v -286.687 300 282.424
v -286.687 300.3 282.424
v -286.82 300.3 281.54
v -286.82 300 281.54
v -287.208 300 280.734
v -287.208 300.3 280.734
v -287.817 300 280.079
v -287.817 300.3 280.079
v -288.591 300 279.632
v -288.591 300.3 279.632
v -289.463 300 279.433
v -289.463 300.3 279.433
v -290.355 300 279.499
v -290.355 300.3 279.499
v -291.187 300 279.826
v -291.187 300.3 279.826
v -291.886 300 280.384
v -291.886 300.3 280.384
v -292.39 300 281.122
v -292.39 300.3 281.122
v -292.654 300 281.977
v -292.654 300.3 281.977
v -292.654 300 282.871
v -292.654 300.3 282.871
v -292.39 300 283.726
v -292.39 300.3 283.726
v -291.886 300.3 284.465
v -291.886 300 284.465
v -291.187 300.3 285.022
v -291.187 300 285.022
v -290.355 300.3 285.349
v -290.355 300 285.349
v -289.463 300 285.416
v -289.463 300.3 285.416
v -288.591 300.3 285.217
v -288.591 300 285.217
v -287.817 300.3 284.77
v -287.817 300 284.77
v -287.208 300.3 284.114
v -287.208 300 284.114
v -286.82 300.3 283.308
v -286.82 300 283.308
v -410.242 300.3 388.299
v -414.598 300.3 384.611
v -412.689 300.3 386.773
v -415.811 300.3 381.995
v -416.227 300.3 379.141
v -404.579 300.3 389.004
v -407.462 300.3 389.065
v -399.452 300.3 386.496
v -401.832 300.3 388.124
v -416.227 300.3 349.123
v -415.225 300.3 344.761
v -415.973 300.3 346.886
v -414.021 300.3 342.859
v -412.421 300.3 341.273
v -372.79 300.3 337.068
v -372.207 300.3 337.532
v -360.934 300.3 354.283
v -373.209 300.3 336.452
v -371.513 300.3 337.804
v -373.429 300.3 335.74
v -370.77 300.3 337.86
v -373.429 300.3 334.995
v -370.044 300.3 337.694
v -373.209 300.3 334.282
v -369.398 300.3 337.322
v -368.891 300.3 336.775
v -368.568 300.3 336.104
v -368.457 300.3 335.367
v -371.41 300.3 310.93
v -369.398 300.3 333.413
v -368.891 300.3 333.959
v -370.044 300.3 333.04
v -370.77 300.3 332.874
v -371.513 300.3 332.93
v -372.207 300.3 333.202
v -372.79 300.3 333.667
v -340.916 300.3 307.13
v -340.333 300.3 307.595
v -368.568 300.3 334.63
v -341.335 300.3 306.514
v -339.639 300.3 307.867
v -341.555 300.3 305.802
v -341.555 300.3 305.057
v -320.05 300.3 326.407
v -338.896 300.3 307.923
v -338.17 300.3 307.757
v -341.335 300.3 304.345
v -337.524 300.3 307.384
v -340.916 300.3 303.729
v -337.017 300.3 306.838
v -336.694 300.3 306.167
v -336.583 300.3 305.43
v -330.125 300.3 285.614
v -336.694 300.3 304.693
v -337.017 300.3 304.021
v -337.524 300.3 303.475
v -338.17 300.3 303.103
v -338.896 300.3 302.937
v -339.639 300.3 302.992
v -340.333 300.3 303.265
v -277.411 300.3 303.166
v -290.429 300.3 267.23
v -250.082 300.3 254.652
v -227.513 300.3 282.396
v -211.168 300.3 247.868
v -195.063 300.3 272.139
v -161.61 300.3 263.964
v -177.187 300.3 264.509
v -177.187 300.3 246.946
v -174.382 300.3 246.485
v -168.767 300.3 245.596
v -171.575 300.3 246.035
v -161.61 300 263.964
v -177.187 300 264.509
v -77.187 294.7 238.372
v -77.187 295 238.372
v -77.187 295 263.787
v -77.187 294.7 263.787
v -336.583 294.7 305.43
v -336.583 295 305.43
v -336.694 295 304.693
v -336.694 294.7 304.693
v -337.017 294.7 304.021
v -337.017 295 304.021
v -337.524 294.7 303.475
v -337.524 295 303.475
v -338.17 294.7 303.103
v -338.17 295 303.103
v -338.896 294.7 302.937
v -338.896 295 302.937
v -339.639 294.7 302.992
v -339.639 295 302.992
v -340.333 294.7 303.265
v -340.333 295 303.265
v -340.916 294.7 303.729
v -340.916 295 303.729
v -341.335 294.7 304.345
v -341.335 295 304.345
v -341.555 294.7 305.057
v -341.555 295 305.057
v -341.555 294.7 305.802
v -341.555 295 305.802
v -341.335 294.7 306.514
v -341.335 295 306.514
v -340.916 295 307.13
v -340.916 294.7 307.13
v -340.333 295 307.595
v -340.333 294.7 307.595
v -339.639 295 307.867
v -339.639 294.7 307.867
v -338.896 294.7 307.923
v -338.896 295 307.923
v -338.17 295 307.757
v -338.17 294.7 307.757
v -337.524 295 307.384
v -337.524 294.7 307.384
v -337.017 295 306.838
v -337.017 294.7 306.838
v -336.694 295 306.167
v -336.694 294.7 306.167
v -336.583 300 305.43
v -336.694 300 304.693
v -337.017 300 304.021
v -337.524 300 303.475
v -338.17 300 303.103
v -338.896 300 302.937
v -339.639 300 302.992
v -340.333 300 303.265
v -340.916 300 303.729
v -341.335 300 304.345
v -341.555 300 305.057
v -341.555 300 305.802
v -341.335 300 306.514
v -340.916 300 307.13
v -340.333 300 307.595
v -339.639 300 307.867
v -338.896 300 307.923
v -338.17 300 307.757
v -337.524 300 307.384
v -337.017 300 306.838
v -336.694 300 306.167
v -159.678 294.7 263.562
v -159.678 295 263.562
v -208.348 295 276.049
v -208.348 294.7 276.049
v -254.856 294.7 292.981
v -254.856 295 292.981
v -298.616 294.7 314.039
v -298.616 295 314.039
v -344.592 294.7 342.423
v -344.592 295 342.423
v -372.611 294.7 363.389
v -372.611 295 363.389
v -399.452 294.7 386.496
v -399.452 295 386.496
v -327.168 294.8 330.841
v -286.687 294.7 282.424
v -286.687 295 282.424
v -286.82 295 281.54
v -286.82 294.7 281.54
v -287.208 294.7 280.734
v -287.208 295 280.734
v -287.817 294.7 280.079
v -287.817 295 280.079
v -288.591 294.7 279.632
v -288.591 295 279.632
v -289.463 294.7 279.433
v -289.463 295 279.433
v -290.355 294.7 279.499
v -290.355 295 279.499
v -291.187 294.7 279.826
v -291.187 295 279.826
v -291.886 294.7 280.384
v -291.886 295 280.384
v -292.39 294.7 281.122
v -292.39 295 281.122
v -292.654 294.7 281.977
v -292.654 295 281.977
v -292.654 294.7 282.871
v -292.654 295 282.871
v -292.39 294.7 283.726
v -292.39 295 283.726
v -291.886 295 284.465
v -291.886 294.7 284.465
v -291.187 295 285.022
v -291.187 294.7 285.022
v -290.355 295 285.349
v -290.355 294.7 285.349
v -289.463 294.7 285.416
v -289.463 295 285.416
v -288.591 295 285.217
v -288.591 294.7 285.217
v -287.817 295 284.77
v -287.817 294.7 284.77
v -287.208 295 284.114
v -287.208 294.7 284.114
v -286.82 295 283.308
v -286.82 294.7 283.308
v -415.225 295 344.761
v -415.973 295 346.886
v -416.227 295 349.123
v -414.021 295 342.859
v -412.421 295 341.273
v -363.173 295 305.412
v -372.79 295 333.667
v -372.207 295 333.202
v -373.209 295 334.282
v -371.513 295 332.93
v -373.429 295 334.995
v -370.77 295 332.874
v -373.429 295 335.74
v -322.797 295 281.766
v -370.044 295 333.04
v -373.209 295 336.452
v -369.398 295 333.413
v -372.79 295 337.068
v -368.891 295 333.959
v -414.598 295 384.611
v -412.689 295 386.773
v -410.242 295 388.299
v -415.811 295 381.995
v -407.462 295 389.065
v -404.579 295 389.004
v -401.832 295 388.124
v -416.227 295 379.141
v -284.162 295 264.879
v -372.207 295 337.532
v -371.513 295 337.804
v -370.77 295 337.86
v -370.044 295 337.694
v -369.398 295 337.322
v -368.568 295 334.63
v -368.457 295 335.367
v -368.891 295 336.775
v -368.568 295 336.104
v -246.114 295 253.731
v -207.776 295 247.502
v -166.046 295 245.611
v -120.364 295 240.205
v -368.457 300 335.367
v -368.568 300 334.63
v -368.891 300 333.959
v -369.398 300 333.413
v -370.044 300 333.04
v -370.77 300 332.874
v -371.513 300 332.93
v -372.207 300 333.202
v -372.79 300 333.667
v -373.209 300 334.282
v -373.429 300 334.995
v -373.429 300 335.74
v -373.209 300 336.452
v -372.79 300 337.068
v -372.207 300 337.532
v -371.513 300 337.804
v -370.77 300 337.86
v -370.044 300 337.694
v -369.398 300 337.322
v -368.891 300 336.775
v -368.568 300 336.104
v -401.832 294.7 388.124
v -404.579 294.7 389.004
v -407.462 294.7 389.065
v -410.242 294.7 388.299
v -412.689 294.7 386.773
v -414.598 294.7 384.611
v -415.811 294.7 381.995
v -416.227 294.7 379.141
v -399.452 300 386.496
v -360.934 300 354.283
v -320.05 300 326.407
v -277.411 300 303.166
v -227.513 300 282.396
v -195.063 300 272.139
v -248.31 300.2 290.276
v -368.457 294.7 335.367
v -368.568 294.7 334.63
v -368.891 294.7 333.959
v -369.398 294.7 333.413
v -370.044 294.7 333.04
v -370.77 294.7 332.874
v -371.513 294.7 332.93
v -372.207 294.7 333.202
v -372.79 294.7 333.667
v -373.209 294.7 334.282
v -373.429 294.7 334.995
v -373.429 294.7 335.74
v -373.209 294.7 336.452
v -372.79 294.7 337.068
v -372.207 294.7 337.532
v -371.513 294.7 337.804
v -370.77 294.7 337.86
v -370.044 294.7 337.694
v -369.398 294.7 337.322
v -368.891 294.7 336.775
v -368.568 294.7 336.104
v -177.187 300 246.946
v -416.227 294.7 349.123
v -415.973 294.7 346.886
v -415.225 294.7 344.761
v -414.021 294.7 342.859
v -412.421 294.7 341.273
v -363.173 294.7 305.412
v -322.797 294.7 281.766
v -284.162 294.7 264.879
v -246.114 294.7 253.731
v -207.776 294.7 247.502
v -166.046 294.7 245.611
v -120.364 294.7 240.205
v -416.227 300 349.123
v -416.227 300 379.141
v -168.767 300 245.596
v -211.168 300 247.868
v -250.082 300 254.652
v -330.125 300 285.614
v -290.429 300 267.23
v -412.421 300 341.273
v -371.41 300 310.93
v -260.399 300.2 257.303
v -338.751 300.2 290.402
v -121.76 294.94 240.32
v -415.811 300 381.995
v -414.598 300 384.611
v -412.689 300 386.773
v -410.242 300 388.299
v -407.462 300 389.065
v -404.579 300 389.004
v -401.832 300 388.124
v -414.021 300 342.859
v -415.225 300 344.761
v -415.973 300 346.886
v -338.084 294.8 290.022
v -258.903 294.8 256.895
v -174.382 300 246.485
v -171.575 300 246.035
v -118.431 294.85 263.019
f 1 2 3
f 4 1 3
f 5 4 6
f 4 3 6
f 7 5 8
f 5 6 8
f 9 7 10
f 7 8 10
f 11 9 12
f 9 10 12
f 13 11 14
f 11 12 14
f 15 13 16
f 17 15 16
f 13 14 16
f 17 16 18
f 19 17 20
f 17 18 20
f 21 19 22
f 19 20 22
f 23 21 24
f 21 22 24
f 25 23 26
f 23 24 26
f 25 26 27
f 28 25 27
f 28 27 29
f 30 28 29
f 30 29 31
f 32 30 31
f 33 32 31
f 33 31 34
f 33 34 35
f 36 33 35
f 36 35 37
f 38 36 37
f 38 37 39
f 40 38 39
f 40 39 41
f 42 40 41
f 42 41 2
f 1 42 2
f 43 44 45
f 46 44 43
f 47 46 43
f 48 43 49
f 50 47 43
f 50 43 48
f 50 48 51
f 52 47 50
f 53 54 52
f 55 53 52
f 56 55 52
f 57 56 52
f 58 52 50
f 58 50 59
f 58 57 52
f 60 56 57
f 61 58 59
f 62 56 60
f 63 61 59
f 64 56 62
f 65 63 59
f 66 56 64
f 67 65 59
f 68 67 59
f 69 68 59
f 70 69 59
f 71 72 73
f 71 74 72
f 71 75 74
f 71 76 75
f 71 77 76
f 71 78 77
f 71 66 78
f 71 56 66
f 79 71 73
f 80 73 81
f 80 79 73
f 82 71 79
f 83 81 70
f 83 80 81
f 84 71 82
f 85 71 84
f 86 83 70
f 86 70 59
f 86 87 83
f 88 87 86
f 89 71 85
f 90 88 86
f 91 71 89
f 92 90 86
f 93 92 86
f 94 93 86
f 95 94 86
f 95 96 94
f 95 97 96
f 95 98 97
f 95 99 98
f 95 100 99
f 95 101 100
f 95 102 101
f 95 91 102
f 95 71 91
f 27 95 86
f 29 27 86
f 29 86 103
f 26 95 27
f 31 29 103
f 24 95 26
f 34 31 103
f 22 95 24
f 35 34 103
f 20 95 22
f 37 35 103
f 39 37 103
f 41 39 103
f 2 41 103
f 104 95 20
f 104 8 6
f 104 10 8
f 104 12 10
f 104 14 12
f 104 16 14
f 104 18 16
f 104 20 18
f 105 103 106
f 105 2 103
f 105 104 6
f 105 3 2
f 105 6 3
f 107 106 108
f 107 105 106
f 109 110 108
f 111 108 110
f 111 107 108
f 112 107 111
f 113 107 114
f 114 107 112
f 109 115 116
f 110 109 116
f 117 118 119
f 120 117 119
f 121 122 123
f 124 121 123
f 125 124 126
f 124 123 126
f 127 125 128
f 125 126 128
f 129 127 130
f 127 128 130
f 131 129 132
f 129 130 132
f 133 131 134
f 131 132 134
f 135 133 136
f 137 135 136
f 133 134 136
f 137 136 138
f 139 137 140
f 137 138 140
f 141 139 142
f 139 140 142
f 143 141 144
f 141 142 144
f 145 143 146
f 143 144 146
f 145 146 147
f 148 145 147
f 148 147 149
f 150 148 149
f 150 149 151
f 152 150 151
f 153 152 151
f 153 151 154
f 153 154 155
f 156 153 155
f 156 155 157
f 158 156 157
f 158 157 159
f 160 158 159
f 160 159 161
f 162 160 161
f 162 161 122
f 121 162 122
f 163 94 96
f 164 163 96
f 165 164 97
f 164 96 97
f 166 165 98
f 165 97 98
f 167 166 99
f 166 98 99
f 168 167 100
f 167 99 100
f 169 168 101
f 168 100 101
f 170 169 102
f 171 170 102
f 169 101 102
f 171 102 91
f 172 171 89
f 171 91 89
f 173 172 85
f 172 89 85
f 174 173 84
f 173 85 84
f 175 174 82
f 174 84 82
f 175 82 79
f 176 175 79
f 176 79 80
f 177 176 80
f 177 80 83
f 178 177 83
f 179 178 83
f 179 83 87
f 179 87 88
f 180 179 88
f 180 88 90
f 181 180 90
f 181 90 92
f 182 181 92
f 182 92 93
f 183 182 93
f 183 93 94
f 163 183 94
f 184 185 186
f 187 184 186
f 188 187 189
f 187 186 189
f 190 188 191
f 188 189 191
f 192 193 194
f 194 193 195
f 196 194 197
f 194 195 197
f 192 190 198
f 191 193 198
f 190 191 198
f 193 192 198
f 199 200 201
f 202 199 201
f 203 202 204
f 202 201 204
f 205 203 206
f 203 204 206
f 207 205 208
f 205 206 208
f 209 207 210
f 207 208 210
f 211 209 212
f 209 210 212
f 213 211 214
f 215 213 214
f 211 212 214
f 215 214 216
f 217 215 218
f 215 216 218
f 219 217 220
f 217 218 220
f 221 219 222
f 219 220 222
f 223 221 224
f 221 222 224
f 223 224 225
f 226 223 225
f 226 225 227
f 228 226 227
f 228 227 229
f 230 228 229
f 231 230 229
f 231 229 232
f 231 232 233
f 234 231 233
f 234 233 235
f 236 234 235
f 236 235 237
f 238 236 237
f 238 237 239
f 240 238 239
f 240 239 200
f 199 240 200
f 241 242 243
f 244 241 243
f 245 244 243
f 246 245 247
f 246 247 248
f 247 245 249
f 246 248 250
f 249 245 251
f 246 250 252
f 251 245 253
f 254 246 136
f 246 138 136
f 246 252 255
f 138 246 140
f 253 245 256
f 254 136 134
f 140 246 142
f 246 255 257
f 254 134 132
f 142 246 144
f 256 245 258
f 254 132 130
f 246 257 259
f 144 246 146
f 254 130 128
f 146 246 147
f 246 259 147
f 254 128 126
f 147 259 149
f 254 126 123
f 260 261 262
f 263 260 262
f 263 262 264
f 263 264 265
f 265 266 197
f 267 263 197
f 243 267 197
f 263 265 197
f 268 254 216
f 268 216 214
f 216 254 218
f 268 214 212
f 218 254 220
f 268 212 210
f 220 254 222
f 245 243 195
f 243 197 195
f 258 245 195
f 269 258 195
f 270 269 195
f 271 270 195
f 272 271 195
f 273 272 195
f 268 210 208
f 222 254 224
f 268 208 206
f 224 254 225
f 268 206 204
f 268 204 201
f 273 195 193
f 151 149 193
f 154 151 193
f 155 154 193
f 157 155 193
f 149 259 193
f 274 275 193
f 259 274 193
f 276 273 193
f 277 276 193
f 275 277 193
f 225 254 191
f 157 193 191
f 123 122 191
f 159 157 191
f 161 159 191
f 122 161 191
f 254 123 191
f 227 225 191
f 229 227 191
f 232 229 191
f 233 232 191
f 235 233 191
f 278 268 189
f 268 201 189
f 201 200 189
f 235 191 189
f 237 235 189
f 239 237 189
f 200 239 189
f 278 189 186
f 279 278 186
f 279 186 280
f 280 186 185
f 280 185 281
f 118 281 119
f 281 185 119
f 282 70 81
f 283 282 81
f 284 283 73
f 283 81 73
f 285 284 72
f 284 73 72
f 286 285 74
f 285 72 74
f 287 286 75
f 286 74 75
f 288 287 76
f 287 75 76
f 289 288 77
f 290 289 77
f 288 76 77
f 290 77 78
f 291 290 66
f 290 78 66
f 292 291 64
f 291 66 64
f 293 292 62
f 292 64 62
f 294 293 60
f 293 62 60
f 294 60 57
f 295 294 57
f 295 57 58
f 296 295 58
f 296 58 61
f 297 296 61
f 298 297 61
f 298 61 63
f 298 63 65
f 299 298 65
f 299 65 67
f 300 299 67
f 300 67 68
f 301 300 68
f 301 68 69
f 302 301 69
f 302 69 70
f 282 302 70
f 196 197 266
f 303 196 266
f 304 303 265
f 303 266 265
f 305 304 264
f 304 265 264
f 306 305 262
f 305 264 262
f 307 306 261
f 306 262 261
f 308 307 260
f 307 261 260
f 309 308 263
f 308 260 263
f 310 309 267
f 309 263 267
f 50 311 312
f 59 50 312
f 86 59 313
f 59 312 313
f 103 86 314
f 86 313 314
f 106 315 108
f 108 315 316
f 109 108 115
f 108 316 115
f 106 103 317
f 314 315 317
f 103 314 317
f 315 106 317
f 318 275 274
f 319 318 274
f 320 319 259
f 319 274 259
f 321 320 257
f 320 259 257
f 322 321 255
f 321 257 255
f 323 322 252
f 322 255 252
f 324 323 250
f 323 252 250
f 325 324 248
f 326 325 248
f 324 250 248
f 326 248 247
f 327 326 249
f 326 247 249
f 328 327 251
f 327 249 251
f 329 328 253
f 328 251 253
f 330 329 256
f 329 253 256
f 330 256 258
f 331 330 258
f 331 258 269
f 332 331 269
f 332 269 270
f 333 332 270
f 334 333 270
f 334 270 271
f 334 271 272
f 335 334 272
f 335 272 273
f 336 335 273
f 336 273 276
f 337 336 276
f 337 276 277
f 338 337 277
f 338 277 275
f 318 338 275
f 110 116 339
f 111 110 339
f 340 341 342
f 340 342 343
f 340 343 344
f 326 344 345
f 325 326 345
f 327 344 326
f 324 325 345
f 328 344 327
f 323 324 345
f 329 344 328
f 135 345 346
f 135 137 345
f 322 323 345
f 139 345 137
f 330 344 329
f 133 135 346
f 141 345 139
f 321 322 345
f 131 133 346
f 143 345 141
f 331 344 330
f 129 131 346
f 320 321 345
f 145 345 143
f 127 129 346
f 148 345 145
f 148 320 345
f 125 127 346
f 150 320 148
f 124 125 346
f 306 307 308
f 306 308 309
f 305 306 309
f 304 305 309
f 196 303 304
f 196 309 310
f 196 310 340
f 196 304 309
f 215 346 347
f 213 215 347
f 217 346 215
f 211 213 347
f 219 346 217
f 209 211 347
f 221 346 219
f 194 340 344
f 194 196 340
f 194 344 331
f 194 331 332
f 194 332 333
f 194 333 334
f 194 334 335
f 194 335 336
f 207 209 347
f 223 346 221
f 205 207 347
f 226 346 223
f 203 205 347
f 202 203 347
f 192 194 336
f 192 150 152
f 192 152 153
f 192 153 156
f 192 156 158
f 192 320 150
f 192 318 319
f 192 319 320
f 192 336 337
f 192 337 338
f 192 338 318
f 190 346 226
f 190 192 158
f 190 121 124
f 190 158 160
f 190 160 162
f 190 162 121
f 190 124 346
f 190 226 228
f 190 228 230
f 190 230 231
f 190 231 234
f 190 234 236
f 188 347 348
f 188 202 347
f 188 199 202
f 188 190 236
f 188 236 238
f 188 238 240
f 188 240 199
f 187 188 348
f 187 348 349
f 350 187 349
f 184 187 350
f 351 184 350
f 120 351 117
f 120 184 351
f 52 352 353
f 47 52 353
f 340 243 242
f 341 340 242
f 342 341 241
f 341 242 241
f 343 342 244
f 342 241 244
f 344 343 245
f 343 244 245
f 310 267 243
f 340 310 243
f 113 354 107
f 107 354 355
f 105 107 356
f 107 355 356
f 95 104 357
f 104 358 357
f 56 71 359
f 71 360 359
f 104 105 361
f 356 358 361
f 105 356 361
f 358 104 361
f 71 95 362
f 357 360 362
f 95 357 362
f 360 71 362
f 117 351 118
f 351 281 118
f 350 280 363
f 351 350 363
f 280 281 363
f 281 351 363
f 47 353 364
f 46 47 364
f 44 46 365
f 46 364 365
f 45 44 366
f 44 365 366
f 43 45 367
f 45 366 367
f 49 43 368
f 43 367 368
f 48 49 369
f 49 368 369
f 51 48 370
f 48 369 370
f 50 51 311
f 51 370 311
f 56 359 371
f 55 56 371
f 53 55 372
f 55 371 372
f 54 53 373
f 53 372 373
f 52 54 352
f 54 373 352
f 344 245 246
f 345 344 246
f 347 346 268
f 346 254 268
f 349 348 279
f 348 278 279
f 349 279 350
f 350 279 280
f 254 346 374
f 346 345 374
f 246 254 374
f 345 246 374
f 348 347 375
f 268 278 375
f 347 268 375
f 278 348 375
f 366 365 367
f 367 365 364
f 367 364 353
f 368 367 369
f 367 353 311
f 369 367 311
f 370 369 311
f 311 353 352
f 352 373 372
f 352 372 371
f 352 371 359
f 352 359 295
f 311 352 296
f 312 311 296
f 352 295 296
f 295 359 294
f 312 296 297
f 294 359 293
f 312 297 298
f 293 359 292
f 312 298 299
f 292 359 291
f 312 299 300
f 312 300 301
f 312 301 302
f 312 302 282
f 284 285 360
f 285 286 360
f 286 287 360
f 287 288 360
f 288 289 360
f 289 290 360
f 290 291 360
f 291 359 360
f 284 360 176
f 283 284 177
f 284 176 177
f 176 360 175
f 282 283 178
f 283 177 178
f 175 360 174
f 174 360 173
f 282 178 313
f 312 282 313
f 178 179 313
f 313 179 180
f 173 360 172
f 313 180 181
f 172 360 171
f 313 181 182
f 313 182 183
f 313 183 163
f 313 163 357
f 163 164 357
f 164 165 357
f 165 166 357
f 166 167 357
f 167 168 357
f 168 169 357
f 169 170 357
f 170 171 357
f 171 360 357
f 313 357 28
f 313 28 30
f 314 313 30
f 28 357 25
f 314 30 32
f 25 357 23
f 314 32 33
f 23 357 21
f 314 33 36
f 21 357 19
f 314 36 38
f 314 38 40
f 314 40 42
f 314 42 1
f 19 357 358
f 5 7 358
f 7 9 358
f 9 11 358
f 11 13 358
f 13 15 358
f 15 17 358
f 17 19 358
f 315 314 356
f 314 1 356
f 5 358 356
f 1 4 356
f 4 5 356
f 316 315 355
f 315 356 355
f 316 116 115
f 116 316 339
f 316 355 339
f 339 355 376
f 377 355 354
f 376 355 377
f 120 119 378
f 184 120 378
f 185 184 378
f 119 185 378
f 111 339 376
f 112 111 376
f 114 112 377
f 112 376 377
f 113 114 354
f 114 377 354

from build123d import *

# Parameters (mm, degrees)
DODANIE_WYCI_GNI_CIE1_DEPTH = 0.3
DODANIE_WYCI_GNI_CIE2_DEPTH = 0.3
SZKIC3_R                    = 2.5
SZKIC3_R_2                  = 3
WYTNIJ_WYCI_GNI_CIE1_DEPTH  = 12


with BuildPart() as part:
    # Szkic1 → Dodanie-wyciągnięcie1 (new body)
    with BuildSketch(Plane.XZ.offset(-295)):
        with BuildLine():
            Line((-77.187477809, 238.371526152), (-77.187477809, 263.787467627))
            add(Edge.make_bspline(
                [(-77.187477809, 263.787467627), (-90.931891454, 263.302665158), (-104.681952299, 263.050489589), (-132.179761623, 262.98712509), (-145.931371492, 263.172070993), (-159.678350984, 263.562143643)],
                knots=[0, 0, 0, 0, 0.5, 0.5, 1, 1, 1, 1], degree=3))
            add(Edge.make_bspline(
                [(-159.678350984, 263.562143643), (-250.706696635, 282.330267514), (-331.16632582, 323.598422626), (-399.451682504, 386.496425626)],
                knots=[0, 0, 0, 0, 0.864061194, 0.864061194, 0.864061194, 0.864061194], degree=3))
            ThreePointArc((-399.451682504, 386.496425626), (-410.242264679, 388.299488123), (-416.226649581, 379.141167568))
            Line((-416.226649581, 379.141167568), (-416.226649581, 349.123356926))
            ThreePointArc((-416.226649581, 349.123356926), (-415.225213611, 344.76149432), (-412.421480502, 341.273256936))
            add(Edge.make_bspline(
                [(-412.421480502, 341.273256936), (-337.562441747, 282.198966343), (-268.684783511, 244.73497802), (-166.046176885, 245.61070335)],
                knots=[0.076862335, 0.076862335, 0.076862335, 0.076862335, 0.98459041, 0.98459041, 0.98459041, 0.98459041], degree=3))
            add(Edge.make_bspline(
                [(-166.046176885, 245.61070335), (-158.691588186, 244.479612696), (-151.319796636, 243.468209688), (-136.557675168, 241.699121012), (-129.165088755, 240.940959885), (-114.354878372, 239.699183419), (-106.937301858, 239.215047722), (-95.790102143, 238.717306802), (-92.070055878, 238.589825858), (-84.62985785, 238.417469406), (-80.909047989, 238.372473536), (-77.187477809, 238.371526152)],
                knots=[0, 0, 0, 0, 0.25, 0.25, 0.5, 0.5, 0.75, 0.75, 0.875, 0.875, 1, 1, 1, 1], degree=3))
        make_face()
    extrude(amount=DODANIE_WYCI_GNI_CIE1_DEPTH)


with BuildPart() as body_2:
    # Szkic2 → Dodanie-wyciągnięcie2 (new body)
    with BuildSketch(Plane(origin=(0, 300, 0), x_dir=(1, 0, 0), z_dir=(0, 1, 0))):
        with BuildLine():
            Line((-177.187477809, -264.509119585), (-177.187477809, -246.945846168))
            ThreePointArc((-177.187477809, -246.945846168), (-172.97904925, -246.258320434), (-168.766510621, -245.596443654))
            add(Edge.make_bspline(
                [(-168.766510621, -245.596443654), (-269.905820359, -245.400566453), (-338.225722809, -282.722388215), (-412.421480502, -341.273256936)],
                knots=[0.084905169, 0.084905169, 0.084905169, 0.084905169, 0.98459041, 0.98459041, 0.98459041, 0.98459041], degree=3))
            ThreePointArc((-412.421480502, -341.273256936), (-415.225213611, -344.76149432), (-416.226649581, -349.123356926))
            Line((-416.226649581, -349.123356926), (-416.226649581, -379.141167568))
            ThreePointArc((-416.226649581, -379.141167568), (-410.242264679, -388.299488123), (-399.451682504, -386.496425626))
            add(Edge.make_bspline(
                [(-399.451682504, -386.496425626), (-331.649658003, -324.043622455), (-251.84509308, -282.915553357), (-161.609691541, -263.964054369)],
                knots=[0, 0, 0, 0, 0.857945262, 0.857945262, 0.857945262, 0.857945262], degree=3))
            add(Edge.make_bspline(
                [(-161.609691541, -263.964054369), (-163.461784936, -264.018551283), (-167.684740985, -264.151245151), (-172.876910079, -264.337762118), (-176.217014145, -264.469751133), (-177.187477809, -264.509119585)],
                knots=[0.455950291, 0.455950291, 0.455950291, 0.455950291, 0.480354949, 0.511604949, 0.524404658, 0.524404658, 0.524404658, 0.524404658], degree=3))
        make_face()
    extrude(amount=DODANIE_WYCI_GNI_CIE2_DEPTH)


with BuildPart() as wytnij_wyci_gni_cie1_tool:
    # Szkic3 → Wytnij-wyciągnięcie1 (new body)
    with BuildSketch(Plane(origin=(0, 300.3, 0), x_dir=(1, 0, 0), z_dir=(0, 1, 0))):
        with Locations((-370.956911026, -335.367132453)):
            Circle(SZKIC3_R)
        with Locations((-339.082998521, -305.429754445)):
            Circle(SZKIC3_R)
        with Locations((-289.68705591, -282.424125213)):
            Circle(SZKIC3_R_2)
    extrude(amount=-WYTNIJ_WYCI_GNI_CIE1_DEPTH)


with BuildPart() as part_1:
    add(part.part)

    # Wytnij-wyciągnięcie1: cut by wytnij_wyci_gni_cie1_tool
    add(wytnij_wyci_gni_cie1_tool.part, mode=Mode.SUBTRACT)


with BuildPart() as body_2_1:
    add(body_2.part)

    # Wytnij-wyciągnięcie1: cut by wytnij_wyci_gni_cie1_tool
    add(wytnij_wyci_gni_cie1_tool.part, mode=Mode.SUBTRACT)


solid = Compound([part_1.part, body_2_1.part])
